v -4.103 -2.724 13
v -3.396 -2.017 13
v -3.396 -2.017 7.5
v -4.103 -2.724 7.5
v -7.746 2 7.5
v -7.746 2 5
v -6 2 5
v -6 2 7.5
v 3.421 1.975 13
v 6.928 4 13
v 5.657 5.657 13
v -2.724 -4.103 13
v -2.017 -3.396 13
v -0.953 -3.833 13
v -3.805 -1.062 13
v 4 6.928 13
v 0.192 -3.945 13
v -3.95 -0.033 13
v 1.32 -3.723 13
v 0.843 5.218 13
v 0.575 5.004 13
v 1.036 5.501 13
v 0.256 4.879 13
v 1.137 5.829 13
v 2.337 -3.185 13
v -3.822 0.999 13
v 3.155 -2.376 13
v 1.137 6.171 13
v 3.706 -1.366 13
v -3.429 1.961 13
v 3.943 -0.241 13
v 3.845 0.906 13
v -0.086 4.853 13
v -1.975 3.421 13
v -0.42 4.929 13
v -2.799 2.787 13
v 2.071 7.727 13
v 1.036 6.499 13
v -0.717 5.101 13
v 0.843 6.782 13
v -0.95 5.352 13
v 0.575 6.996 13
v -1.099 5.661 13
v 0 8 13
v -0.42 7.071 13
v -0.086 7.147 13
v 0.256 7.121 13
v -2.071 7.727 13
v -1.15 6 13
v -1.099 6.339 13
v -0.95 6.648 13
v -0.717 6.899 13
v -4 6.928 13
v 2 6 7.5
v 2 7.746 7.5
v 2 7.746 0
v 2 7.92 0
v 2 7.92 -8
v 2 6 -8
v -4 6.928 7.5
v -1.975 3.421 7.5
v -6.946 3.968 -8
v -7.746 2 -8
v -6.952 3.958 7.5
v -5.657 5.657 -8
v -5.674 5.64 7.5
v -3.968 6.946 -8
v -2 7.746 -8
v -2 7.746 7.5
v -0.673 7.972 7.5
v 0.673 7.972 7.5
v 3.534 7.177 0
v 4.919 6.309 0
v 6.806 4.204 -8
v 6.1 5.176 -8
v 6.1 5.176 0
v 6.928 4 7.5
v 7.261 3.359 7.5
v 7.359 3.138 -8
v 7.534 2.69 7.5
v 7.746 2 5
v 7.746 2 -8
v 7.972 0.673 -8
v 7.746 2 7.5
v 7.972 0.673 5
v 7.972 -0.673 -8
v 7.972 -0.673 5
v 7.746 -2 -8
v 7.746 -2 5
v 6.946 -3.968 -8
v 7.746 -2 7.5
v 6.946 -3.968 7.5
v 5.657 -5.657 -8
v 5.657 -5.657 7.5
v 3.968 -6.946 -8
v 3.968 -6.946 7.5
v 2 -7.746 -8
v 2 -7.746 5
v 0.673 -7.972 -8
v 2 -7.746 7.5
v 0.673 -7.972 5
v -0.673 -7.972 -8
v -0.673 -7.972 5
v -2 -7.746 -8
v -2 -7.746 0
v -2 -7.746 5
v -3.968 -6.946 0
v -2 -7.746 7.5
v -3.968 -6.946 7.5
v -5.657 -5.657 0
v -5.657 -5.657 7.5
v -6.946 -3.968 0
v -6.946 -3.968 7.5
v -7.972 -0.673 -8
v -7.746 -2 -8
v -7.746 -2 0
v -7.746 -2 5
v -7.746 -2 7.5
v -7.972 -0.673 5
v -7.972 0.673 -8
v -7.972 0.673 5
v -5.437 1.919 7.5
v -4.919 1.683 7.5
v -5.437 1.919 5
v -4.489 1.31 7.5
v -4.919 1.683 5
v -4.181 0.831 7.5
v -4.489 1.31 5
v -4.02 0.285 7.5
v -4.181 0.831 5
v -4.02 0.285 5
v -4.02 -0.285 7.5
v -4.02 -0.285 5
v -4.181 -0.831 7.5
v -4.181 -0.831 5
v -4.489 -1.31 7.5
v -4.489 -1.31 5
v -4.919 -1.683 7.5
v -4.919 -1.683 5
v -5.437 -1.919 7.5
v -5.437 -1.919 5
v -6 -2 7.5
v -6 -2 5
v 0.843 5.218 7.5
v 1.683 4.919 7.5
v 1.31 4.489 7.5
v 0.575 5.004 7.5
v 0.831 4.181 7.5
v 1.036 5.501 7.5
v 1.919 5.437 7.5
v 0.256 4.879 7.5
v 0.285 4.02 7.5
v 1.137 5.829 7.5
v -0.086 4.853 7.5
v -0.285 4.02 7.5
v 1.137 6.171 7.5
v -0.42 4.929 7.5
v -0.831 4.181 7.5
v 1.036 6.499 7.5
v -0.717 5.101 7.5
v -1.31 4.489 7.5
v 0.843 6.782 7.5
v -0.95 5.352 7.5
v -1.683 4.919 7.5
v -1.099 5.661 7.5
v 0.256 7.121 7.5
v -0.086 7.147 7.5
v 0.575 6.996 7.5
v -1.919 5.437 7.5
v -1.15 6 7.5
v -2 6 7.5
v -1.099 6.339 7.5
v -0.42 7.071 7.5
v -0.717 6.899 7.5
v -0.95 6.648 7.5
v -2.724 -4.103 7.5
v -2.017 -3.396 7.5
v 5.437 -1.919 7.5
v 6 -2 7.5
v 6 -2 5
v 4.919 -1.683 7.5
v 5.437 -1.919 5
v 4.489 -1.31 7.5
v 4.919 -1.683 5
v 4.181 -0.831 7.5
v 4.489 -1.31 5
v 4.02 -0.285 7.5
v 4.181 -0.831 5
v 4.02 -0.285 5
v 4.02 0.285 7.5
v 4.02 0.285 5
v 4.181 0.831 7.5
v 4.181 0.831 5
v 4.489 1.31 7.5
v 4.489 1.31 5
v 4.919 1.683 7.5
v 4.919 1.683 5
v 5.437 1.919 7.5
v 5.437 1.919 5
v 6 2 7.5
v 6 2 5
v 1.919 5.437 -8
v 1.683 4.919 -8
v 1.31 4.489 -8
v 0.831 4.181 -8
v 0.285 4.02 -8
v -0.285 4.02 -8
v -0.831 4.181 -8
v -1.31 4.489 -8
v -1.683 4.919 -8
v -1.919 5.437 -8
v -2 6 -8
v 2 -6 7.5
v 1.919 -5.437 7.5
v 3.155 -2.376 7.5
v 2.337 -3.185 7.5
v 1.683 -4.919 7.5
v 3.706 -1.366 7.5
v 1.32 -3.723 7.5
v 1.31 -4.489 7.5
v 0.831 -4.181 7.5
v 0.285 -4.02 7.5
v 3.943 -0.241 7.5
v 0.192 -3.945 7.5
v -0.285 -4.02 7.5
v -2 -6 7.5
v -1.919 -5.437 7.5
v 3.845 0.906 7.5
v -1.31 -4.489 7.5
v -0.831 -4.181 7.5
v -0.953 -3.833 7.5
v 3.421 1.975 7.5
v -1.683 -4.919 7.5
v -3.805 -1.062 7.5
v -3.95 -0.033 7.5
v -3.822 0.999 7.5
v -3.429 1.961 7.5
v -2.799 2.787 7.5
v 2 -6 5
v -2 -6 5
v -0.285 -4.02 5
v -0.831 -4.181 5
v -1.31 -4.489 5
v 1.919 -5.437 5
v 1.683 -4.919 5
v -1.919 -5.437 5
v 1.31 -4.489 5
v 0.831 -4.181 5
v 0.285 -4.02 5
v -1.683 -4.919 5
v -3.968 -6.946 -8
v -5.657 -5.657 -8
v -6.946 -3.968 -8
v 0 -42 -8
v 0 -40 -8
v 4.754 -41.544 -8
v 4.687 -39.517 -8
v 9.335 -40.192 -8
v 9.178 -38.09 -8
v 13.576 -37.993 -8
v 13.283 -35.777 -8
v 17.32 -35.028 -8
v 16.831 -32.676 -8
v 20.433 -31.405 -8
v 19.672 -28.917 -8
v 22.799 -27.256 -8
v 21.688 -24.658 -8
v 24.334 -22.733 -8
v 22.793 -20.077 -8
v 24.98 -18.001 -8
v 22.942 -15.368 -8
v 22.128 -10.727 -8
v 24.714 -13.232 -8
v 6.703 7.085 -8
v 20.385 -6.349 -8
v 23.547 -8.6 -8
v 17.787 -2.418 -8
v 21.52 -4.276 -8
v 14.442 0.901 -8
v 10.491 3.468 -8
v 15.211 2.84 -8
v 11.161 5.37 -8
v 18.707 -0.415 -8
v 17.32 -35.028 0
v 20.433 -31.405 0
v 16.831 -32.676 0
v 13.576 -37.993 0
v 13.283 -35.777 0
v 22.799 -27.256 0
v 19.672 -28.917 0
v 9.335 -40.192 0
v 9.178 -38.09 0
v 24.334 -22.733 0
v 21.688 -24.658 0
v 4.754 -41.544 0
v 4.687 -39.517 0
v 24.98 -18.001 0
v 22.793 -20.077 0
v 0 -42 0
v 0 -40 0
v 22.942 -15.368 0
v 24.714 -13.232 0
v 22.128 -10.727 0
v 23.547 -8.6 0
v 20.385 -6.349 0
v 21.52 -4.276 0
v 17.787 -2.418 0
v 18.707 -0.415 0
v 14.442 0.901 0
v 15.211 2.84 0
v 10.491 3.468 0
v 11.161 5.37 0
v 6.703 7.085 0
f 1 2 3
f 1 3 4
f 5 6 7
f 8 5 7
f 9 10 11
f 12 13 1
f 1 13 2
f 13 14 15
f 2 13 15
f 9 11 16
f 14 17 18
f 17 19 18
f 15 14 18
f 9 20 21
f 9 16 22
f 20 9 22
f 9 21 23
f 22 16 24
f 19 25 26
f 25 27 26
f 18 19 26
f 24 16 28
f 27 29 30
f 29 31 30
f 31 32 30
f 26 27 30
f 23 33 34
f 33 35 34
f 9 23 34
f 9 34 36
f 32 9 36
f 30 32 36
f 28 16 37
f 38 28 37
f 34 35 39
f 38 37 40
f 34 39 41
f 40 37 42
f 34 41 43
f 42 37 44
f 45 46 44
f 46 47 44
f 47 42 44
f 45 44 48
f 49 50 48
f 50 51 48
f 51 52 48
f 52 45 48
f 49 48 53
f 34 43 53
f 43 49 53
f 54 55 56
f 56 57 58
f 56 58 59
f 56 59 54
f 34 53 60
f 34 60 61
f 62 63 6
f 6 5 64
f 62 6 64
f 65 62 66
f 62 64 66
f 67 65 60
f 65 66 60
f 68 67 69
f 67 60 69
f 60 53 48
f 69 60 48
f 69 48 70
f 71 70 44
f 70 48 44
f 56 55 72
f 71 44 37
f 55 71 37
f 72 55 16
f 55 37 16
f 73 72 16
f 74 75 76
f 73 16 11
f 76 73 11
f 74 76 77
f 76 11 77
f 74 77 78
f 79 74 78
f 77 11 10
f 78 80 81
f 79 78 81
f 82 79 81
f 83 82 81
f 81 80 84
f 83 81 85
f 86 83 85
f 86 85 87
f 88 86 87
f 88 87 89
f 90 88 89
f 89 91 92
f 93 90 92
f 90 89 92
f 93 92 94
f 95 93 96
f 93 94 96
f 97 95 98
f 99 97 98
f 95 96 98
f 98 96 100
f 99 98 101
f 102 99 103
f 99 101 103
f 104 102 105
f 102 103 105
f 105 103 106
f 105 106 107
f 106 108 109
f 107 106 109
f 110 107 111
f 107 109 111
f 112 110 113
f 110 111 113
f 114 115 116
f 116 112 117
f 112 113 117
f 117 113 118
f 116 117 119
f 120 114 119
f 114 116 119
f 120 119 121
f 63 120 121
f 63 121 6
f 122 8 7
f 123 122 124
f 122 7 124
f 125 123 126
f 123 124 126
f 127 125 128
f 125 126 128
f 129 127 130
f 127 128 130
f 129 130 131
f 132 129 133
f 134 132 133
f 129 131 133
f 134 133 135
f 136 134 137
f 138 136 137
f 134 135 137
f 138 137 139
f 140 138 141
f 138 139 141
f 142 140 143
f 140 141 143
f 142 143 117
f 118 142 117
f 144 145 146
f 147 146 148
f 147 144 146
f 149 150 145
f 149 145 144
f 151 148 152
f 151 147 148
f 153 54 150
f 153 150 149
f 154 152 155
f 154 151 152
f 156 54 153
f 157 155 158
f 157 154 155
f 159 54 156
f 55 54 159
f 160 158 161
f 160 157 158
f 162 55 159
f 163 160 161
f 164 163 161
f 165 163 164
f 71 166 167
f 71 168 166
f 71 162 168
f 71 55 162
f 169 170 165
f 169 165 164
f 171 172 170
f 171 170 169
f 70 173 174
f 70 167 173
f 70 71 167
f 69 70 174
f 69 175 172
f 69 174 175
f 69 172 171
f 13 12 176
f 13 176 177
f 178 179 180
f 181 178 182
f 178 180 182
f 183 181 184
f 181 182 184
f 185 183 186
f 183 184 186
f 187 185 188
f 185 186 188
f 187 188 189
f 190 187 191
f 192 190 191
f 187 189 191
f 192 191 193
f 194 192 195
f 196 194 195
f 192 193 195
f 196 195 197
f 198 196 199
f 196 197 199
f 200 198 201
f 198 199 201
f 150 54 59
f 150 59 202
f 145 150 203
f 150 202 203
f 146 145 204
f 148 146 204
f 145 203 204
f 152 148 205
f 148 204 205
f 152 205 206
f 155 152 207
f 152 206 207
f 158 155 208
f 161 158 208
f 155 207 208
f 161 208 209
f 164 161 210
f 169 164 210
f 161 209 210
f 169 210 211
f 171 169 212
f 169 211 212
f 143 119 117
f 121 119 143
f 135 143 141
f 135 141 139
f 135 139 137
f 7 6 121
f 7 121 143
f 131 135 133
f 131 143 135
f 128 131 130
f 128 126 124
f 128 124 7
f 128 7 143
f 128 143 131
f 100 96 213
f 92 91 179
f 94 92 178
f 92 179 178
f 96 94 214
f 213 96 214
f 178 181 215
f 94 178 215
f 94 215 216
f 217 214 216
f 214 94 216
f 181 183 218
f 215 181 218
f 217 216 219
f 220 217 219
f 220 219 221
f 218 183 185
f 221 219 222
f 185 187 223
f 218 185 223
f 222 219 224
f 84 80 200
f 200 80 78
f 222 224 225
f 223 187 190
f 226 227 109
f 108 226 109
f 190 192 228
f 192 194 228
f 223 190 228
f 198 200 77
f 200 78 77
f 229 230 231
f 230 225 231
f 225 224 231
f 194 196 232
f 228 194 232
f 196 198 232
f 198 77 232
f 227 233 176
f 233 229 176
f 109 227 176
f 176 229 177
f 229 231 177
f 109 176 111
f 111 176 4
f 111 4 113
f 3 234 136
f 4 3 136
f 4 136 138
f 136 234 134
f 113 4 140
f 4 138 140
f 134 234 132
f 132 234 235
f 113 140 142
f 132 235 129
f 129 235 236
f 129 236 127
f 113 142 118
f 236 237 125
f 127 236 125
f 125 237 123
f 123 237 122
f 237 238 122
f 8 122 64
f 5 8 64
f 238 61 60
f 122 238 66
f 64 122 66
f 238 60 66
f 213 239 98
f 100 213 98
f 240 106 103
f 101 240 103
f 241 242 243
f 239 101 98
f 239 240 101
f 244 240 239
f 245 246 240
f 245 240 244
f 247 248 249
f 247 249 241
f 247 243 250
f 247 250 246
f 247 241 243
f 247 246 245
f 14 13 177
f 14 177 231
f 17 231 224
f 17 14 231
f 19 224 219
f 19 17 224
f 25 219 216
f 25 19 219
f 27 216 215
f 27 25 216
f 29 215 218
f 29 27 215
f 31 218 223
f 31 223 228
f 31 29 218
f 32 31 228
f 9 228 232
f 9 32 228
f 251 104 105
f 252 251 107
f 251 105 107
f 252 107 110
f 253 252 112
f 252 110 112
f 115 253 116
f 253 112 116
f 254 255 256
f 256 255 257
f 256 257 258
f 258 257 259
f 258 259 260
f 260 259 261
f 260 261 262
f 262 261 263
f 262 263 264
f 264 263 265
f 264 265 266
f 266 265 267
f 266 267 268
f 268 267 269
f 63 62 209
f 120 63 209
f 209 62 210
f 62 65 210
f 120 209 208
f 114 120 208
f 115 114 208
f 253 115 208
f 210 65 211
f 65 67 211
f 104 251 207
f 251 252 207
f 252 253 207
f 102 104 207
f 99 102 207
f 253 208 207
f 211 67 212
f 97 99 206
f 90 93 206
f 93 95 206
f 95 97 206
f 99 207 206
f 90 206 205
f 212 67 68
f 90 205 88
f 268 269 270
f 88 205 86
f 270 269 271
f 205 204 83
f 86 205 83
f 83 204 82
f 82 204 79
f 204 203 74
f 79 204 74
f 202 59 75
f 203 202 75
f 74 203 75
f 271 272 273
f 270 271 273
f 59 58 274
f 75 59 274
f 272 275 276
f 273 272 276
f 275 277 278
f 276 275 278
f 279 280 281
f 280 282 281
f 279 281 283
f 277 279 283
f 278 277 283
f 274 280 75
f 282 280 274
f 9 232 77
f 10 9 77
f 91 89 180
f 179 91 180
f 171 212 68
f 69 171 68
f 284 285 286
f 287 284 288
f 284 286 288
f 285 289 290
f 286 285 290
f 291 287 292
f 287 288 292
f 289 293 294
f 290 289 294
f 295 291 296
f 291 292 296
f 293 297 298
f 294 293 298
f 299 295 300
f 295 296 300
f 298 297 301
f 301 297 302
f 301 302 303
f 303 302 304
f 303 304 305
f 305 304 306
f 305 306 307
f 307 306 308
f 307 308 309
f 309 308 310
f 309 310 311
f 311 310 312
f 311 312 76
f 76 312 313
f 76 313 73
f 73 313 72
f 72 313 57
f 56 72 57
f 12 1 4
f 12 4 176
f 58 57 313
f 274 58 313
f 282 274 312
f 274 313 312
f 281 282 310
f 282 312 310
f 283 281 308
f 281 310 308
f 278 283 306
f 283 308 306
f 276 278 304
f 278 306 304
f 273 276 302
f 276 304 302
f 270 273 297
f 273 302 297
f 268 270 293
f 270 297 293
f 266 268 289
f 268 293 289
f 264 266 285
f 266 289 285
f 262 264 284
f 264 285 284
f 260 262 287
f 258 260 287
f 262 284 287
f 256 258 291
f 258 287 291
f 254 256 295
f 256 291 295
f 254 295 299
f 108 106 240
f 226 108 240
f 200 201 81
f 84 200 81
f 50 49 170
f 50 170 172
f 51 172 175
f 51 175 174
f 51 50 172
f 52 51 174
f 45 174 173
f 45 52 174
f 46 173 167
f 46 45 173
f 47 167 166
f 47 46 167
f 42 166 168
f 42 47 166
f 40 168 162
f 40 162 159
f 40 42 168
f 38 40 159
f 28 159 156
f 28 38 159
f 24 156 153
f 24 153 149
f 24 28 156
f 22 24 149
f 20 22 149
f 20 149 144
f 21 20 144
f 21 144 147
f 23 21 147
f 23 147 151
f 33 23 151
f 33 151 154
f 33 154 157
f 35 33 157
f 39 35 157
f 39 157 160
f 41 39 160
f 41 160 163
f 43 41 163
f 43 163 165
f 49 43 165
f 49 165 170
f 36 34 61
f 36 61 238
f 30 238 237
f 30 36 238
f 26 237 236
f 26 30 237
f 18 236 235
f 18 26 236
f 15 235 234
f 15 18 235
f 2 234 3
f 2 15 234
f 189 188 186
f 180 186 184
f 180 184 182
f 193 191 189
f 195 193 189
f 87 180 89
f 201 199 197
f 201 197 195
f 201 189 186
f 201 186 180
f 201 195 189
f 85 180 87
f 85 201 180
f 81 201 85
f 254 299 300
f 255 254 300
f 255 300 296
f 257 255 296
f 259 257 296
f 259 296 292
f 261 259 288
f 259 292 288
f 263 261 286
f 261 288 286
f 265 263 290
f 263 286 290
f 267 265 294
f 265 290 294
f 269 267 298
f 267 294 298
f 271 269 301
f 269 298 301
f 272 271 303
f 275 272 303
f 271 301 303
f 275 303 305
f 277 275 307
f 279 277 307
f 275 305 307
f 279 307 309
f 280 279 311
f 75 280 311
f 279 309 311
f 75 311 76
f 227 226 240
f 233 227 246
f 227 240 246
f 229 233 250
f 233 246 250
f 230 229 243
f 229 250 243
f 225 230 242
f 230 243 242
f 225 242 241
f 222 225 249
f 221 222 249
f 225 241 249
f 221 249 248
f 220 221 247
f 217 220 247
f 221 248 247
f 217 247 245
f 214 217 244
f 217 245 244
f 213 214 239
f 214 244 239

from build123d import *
from build123d.topology import SkipClean

# Parameters (mm, degrees)
SKETCH1_R           = 1.15
BOSS_EXTRUDE1_DEPTH = 8
BOSS_EXTRUDE2_START = 13
SKETCH4_R           = 8
SKETCH4_R_2         = 1.15
BOSS_EXTRUDE2_DEPTH = 13
CUT_EXTRUDE3_DEPTH  = 15.5
CUT_EXTRUDE4_DEPTH  = 5.5
BOSS_EXTRUDE3_START = -13
BOSS_EXTRUDE3_DEPTH = 13


with BuildPart() as part:
    # Sketch1 → Boss-Extrude1 (new body)
    with BuildSketch(Plane.XY):
        with BuildLine():
            Line((0, -42), (0, -40))
            ThreePointArc((0, -40), (22.793187837, -20.077432085), (6.099520657, 5.176470588))
            ThreePointArc((6.099520657, 5.176470588), (7.259881704, -3.360672202), (0, -8))
            ThreePointArc((0, -8), (-8, 0), (0, 8))
            ThreePointArc((0, 8), (25, -17), (0, -42))
        make_face()
        with Locations((0, 6)):
            Circle(SKETCH1_R, mode=Mode.SUBTRACT)
        with Locations((-6, 0)):
            Circle(SKETCH1_R, mode=Mode.SUBTRACT)
        with Locations((0, -6)):
            Circle(SKETCH1_R, mode=Mode.SUBTRACT)
        with Locations((6, 0)):
            Circle(SKETCH1_R, mode=Mode.SUBTRACT)
    extrude(amount=BOSS_EXTRUDE1_DEPTH)

    # Sketch4 → Boss-Extrude2 (add)
    with SkipClean():  # the faces are left unmerged after this step: merging them gives an invalid solid
        with BuildSketch(Plane(origin=(0, 0, 0), x_dir=(-1, 0, 0), z_dir=(0, 0, -1)).offset(BOSS_EXTRUDE2_START)):
            Circle(SKETCH4_R)
            with Locations((0, 6)):
                Circle(SKETCH4_R_2, mode=Mode.SUBTRACT)
            with Locations((-6, 0)):
                Circle(SKETCH4_R_2, mode=Mode.SUBTRACT)
            with Locations((0, -6)):
                Circle(SKETCH4_R_2, mode=Mode.SUBTRACT)
            with Locations((6, 0)):
                Circle(SKETCH4_R_2, mode=Mode.SUBTRACT)
        extrude(amount=-BOSS_EXTRUDE2_DEPTH)

    # Sketch3 → Cut-Extrude3 (cut)
    with BuildSketch(Plane.XY.offset(8)):
        with BuildLine():
            Line((6, 2), (10, 2))
            Line((10, 2), (10, -2))
            Line((10, -2), (6, -2))
            ThreePointArc((6, -2), (4, 0), (6, 2))
        make_face()
        with BuildLine():
            Line((2, -6), (2, -10))
            Line((2, -10), (-2, -10))
            Line((-2, -10), (-2, -6))
            ThreePointArc((-2, -6), (0, -4), (2, -6))
        make_face()
        with BuildLine():
            Line((-6, -2), (-10, -2))
            Line((-10, -2), (-10, 2))
            Line((-10, 2), (-6, 2))
            ThreePointArc((-6, 2), (-4, 0), (-6, -2))
        make_face()
        with BuildLine():
            Line((-2, 6), (-2, 10))
            Line((-2, 10), (2, 10))
            Line((2, 10), (2, 6))
            ThreePointArc((2, 6), (0, 4), (-2, 6))
        make_face()
    extrude(amount=-CUT_EXTRUDE3_DEPTH, mode=Mode.SUBTRACT)

    # Sketch5 → Cut-Extrude4 (cut)
    with BuildSketch(Plane(origin=(0, 0, -13), x_dir=(-1, 0, 0), z_dir=(0, 0, -1))):
        with BuildLine():
            Line((-3.420800345, 1.975), (-6.92820323, 4))
            ThreePointArc((-6.92820323, 4), (2.070552361, -7.72740661), (4, 6.92820323))
            Line((4, 6.92820323), (1.975, 3.420800345))
            ThreePointArc((1.975, 3.420800345), (3.821665179, 0.998686766), (3.396076023, -2.017217799))
            Line((3.396076023, -2.017217799), (4.103182804, -2.72432458))
            Line((4.103182804, -2.72432458), (2.72432458, -4.103182804))
            Line((2.72432458, -4.103182804), (2.017217799, -3.396076023))
            ThreePointArc((2.017217799, -3.396076023), (-2.775720699, -2.810315747), (-3.420800345, 1.975))
        make_face()
    extrude(amount=-CUT_EXTRUDE4_DEPTH, mode=Mode.SUBTRACT)

    # Sketch6 → Boss-Extrude3 (add)
    with BuildSketch(Plane.XY.offset(8).offset(BOSS_EXTRUDE3_START)):
        with BuildLine():
            Line((5.656854249, 5.656854249), (0, 0))
            Line((0, 0), (-5.656854249, 5.656854249))
            ThreePointArc((-5.656854249, 5.656854249), (0, -8), (5.656854249, 5.656854249))
        make_face()
    extrude(amount=BOSS_EXTRUDE3_DEPTH)


with BuildPart() as body_2:
    # Mirror2: mirrored copy
    add(part.part.mirror(Plane.XY))


solid = body_2.part
